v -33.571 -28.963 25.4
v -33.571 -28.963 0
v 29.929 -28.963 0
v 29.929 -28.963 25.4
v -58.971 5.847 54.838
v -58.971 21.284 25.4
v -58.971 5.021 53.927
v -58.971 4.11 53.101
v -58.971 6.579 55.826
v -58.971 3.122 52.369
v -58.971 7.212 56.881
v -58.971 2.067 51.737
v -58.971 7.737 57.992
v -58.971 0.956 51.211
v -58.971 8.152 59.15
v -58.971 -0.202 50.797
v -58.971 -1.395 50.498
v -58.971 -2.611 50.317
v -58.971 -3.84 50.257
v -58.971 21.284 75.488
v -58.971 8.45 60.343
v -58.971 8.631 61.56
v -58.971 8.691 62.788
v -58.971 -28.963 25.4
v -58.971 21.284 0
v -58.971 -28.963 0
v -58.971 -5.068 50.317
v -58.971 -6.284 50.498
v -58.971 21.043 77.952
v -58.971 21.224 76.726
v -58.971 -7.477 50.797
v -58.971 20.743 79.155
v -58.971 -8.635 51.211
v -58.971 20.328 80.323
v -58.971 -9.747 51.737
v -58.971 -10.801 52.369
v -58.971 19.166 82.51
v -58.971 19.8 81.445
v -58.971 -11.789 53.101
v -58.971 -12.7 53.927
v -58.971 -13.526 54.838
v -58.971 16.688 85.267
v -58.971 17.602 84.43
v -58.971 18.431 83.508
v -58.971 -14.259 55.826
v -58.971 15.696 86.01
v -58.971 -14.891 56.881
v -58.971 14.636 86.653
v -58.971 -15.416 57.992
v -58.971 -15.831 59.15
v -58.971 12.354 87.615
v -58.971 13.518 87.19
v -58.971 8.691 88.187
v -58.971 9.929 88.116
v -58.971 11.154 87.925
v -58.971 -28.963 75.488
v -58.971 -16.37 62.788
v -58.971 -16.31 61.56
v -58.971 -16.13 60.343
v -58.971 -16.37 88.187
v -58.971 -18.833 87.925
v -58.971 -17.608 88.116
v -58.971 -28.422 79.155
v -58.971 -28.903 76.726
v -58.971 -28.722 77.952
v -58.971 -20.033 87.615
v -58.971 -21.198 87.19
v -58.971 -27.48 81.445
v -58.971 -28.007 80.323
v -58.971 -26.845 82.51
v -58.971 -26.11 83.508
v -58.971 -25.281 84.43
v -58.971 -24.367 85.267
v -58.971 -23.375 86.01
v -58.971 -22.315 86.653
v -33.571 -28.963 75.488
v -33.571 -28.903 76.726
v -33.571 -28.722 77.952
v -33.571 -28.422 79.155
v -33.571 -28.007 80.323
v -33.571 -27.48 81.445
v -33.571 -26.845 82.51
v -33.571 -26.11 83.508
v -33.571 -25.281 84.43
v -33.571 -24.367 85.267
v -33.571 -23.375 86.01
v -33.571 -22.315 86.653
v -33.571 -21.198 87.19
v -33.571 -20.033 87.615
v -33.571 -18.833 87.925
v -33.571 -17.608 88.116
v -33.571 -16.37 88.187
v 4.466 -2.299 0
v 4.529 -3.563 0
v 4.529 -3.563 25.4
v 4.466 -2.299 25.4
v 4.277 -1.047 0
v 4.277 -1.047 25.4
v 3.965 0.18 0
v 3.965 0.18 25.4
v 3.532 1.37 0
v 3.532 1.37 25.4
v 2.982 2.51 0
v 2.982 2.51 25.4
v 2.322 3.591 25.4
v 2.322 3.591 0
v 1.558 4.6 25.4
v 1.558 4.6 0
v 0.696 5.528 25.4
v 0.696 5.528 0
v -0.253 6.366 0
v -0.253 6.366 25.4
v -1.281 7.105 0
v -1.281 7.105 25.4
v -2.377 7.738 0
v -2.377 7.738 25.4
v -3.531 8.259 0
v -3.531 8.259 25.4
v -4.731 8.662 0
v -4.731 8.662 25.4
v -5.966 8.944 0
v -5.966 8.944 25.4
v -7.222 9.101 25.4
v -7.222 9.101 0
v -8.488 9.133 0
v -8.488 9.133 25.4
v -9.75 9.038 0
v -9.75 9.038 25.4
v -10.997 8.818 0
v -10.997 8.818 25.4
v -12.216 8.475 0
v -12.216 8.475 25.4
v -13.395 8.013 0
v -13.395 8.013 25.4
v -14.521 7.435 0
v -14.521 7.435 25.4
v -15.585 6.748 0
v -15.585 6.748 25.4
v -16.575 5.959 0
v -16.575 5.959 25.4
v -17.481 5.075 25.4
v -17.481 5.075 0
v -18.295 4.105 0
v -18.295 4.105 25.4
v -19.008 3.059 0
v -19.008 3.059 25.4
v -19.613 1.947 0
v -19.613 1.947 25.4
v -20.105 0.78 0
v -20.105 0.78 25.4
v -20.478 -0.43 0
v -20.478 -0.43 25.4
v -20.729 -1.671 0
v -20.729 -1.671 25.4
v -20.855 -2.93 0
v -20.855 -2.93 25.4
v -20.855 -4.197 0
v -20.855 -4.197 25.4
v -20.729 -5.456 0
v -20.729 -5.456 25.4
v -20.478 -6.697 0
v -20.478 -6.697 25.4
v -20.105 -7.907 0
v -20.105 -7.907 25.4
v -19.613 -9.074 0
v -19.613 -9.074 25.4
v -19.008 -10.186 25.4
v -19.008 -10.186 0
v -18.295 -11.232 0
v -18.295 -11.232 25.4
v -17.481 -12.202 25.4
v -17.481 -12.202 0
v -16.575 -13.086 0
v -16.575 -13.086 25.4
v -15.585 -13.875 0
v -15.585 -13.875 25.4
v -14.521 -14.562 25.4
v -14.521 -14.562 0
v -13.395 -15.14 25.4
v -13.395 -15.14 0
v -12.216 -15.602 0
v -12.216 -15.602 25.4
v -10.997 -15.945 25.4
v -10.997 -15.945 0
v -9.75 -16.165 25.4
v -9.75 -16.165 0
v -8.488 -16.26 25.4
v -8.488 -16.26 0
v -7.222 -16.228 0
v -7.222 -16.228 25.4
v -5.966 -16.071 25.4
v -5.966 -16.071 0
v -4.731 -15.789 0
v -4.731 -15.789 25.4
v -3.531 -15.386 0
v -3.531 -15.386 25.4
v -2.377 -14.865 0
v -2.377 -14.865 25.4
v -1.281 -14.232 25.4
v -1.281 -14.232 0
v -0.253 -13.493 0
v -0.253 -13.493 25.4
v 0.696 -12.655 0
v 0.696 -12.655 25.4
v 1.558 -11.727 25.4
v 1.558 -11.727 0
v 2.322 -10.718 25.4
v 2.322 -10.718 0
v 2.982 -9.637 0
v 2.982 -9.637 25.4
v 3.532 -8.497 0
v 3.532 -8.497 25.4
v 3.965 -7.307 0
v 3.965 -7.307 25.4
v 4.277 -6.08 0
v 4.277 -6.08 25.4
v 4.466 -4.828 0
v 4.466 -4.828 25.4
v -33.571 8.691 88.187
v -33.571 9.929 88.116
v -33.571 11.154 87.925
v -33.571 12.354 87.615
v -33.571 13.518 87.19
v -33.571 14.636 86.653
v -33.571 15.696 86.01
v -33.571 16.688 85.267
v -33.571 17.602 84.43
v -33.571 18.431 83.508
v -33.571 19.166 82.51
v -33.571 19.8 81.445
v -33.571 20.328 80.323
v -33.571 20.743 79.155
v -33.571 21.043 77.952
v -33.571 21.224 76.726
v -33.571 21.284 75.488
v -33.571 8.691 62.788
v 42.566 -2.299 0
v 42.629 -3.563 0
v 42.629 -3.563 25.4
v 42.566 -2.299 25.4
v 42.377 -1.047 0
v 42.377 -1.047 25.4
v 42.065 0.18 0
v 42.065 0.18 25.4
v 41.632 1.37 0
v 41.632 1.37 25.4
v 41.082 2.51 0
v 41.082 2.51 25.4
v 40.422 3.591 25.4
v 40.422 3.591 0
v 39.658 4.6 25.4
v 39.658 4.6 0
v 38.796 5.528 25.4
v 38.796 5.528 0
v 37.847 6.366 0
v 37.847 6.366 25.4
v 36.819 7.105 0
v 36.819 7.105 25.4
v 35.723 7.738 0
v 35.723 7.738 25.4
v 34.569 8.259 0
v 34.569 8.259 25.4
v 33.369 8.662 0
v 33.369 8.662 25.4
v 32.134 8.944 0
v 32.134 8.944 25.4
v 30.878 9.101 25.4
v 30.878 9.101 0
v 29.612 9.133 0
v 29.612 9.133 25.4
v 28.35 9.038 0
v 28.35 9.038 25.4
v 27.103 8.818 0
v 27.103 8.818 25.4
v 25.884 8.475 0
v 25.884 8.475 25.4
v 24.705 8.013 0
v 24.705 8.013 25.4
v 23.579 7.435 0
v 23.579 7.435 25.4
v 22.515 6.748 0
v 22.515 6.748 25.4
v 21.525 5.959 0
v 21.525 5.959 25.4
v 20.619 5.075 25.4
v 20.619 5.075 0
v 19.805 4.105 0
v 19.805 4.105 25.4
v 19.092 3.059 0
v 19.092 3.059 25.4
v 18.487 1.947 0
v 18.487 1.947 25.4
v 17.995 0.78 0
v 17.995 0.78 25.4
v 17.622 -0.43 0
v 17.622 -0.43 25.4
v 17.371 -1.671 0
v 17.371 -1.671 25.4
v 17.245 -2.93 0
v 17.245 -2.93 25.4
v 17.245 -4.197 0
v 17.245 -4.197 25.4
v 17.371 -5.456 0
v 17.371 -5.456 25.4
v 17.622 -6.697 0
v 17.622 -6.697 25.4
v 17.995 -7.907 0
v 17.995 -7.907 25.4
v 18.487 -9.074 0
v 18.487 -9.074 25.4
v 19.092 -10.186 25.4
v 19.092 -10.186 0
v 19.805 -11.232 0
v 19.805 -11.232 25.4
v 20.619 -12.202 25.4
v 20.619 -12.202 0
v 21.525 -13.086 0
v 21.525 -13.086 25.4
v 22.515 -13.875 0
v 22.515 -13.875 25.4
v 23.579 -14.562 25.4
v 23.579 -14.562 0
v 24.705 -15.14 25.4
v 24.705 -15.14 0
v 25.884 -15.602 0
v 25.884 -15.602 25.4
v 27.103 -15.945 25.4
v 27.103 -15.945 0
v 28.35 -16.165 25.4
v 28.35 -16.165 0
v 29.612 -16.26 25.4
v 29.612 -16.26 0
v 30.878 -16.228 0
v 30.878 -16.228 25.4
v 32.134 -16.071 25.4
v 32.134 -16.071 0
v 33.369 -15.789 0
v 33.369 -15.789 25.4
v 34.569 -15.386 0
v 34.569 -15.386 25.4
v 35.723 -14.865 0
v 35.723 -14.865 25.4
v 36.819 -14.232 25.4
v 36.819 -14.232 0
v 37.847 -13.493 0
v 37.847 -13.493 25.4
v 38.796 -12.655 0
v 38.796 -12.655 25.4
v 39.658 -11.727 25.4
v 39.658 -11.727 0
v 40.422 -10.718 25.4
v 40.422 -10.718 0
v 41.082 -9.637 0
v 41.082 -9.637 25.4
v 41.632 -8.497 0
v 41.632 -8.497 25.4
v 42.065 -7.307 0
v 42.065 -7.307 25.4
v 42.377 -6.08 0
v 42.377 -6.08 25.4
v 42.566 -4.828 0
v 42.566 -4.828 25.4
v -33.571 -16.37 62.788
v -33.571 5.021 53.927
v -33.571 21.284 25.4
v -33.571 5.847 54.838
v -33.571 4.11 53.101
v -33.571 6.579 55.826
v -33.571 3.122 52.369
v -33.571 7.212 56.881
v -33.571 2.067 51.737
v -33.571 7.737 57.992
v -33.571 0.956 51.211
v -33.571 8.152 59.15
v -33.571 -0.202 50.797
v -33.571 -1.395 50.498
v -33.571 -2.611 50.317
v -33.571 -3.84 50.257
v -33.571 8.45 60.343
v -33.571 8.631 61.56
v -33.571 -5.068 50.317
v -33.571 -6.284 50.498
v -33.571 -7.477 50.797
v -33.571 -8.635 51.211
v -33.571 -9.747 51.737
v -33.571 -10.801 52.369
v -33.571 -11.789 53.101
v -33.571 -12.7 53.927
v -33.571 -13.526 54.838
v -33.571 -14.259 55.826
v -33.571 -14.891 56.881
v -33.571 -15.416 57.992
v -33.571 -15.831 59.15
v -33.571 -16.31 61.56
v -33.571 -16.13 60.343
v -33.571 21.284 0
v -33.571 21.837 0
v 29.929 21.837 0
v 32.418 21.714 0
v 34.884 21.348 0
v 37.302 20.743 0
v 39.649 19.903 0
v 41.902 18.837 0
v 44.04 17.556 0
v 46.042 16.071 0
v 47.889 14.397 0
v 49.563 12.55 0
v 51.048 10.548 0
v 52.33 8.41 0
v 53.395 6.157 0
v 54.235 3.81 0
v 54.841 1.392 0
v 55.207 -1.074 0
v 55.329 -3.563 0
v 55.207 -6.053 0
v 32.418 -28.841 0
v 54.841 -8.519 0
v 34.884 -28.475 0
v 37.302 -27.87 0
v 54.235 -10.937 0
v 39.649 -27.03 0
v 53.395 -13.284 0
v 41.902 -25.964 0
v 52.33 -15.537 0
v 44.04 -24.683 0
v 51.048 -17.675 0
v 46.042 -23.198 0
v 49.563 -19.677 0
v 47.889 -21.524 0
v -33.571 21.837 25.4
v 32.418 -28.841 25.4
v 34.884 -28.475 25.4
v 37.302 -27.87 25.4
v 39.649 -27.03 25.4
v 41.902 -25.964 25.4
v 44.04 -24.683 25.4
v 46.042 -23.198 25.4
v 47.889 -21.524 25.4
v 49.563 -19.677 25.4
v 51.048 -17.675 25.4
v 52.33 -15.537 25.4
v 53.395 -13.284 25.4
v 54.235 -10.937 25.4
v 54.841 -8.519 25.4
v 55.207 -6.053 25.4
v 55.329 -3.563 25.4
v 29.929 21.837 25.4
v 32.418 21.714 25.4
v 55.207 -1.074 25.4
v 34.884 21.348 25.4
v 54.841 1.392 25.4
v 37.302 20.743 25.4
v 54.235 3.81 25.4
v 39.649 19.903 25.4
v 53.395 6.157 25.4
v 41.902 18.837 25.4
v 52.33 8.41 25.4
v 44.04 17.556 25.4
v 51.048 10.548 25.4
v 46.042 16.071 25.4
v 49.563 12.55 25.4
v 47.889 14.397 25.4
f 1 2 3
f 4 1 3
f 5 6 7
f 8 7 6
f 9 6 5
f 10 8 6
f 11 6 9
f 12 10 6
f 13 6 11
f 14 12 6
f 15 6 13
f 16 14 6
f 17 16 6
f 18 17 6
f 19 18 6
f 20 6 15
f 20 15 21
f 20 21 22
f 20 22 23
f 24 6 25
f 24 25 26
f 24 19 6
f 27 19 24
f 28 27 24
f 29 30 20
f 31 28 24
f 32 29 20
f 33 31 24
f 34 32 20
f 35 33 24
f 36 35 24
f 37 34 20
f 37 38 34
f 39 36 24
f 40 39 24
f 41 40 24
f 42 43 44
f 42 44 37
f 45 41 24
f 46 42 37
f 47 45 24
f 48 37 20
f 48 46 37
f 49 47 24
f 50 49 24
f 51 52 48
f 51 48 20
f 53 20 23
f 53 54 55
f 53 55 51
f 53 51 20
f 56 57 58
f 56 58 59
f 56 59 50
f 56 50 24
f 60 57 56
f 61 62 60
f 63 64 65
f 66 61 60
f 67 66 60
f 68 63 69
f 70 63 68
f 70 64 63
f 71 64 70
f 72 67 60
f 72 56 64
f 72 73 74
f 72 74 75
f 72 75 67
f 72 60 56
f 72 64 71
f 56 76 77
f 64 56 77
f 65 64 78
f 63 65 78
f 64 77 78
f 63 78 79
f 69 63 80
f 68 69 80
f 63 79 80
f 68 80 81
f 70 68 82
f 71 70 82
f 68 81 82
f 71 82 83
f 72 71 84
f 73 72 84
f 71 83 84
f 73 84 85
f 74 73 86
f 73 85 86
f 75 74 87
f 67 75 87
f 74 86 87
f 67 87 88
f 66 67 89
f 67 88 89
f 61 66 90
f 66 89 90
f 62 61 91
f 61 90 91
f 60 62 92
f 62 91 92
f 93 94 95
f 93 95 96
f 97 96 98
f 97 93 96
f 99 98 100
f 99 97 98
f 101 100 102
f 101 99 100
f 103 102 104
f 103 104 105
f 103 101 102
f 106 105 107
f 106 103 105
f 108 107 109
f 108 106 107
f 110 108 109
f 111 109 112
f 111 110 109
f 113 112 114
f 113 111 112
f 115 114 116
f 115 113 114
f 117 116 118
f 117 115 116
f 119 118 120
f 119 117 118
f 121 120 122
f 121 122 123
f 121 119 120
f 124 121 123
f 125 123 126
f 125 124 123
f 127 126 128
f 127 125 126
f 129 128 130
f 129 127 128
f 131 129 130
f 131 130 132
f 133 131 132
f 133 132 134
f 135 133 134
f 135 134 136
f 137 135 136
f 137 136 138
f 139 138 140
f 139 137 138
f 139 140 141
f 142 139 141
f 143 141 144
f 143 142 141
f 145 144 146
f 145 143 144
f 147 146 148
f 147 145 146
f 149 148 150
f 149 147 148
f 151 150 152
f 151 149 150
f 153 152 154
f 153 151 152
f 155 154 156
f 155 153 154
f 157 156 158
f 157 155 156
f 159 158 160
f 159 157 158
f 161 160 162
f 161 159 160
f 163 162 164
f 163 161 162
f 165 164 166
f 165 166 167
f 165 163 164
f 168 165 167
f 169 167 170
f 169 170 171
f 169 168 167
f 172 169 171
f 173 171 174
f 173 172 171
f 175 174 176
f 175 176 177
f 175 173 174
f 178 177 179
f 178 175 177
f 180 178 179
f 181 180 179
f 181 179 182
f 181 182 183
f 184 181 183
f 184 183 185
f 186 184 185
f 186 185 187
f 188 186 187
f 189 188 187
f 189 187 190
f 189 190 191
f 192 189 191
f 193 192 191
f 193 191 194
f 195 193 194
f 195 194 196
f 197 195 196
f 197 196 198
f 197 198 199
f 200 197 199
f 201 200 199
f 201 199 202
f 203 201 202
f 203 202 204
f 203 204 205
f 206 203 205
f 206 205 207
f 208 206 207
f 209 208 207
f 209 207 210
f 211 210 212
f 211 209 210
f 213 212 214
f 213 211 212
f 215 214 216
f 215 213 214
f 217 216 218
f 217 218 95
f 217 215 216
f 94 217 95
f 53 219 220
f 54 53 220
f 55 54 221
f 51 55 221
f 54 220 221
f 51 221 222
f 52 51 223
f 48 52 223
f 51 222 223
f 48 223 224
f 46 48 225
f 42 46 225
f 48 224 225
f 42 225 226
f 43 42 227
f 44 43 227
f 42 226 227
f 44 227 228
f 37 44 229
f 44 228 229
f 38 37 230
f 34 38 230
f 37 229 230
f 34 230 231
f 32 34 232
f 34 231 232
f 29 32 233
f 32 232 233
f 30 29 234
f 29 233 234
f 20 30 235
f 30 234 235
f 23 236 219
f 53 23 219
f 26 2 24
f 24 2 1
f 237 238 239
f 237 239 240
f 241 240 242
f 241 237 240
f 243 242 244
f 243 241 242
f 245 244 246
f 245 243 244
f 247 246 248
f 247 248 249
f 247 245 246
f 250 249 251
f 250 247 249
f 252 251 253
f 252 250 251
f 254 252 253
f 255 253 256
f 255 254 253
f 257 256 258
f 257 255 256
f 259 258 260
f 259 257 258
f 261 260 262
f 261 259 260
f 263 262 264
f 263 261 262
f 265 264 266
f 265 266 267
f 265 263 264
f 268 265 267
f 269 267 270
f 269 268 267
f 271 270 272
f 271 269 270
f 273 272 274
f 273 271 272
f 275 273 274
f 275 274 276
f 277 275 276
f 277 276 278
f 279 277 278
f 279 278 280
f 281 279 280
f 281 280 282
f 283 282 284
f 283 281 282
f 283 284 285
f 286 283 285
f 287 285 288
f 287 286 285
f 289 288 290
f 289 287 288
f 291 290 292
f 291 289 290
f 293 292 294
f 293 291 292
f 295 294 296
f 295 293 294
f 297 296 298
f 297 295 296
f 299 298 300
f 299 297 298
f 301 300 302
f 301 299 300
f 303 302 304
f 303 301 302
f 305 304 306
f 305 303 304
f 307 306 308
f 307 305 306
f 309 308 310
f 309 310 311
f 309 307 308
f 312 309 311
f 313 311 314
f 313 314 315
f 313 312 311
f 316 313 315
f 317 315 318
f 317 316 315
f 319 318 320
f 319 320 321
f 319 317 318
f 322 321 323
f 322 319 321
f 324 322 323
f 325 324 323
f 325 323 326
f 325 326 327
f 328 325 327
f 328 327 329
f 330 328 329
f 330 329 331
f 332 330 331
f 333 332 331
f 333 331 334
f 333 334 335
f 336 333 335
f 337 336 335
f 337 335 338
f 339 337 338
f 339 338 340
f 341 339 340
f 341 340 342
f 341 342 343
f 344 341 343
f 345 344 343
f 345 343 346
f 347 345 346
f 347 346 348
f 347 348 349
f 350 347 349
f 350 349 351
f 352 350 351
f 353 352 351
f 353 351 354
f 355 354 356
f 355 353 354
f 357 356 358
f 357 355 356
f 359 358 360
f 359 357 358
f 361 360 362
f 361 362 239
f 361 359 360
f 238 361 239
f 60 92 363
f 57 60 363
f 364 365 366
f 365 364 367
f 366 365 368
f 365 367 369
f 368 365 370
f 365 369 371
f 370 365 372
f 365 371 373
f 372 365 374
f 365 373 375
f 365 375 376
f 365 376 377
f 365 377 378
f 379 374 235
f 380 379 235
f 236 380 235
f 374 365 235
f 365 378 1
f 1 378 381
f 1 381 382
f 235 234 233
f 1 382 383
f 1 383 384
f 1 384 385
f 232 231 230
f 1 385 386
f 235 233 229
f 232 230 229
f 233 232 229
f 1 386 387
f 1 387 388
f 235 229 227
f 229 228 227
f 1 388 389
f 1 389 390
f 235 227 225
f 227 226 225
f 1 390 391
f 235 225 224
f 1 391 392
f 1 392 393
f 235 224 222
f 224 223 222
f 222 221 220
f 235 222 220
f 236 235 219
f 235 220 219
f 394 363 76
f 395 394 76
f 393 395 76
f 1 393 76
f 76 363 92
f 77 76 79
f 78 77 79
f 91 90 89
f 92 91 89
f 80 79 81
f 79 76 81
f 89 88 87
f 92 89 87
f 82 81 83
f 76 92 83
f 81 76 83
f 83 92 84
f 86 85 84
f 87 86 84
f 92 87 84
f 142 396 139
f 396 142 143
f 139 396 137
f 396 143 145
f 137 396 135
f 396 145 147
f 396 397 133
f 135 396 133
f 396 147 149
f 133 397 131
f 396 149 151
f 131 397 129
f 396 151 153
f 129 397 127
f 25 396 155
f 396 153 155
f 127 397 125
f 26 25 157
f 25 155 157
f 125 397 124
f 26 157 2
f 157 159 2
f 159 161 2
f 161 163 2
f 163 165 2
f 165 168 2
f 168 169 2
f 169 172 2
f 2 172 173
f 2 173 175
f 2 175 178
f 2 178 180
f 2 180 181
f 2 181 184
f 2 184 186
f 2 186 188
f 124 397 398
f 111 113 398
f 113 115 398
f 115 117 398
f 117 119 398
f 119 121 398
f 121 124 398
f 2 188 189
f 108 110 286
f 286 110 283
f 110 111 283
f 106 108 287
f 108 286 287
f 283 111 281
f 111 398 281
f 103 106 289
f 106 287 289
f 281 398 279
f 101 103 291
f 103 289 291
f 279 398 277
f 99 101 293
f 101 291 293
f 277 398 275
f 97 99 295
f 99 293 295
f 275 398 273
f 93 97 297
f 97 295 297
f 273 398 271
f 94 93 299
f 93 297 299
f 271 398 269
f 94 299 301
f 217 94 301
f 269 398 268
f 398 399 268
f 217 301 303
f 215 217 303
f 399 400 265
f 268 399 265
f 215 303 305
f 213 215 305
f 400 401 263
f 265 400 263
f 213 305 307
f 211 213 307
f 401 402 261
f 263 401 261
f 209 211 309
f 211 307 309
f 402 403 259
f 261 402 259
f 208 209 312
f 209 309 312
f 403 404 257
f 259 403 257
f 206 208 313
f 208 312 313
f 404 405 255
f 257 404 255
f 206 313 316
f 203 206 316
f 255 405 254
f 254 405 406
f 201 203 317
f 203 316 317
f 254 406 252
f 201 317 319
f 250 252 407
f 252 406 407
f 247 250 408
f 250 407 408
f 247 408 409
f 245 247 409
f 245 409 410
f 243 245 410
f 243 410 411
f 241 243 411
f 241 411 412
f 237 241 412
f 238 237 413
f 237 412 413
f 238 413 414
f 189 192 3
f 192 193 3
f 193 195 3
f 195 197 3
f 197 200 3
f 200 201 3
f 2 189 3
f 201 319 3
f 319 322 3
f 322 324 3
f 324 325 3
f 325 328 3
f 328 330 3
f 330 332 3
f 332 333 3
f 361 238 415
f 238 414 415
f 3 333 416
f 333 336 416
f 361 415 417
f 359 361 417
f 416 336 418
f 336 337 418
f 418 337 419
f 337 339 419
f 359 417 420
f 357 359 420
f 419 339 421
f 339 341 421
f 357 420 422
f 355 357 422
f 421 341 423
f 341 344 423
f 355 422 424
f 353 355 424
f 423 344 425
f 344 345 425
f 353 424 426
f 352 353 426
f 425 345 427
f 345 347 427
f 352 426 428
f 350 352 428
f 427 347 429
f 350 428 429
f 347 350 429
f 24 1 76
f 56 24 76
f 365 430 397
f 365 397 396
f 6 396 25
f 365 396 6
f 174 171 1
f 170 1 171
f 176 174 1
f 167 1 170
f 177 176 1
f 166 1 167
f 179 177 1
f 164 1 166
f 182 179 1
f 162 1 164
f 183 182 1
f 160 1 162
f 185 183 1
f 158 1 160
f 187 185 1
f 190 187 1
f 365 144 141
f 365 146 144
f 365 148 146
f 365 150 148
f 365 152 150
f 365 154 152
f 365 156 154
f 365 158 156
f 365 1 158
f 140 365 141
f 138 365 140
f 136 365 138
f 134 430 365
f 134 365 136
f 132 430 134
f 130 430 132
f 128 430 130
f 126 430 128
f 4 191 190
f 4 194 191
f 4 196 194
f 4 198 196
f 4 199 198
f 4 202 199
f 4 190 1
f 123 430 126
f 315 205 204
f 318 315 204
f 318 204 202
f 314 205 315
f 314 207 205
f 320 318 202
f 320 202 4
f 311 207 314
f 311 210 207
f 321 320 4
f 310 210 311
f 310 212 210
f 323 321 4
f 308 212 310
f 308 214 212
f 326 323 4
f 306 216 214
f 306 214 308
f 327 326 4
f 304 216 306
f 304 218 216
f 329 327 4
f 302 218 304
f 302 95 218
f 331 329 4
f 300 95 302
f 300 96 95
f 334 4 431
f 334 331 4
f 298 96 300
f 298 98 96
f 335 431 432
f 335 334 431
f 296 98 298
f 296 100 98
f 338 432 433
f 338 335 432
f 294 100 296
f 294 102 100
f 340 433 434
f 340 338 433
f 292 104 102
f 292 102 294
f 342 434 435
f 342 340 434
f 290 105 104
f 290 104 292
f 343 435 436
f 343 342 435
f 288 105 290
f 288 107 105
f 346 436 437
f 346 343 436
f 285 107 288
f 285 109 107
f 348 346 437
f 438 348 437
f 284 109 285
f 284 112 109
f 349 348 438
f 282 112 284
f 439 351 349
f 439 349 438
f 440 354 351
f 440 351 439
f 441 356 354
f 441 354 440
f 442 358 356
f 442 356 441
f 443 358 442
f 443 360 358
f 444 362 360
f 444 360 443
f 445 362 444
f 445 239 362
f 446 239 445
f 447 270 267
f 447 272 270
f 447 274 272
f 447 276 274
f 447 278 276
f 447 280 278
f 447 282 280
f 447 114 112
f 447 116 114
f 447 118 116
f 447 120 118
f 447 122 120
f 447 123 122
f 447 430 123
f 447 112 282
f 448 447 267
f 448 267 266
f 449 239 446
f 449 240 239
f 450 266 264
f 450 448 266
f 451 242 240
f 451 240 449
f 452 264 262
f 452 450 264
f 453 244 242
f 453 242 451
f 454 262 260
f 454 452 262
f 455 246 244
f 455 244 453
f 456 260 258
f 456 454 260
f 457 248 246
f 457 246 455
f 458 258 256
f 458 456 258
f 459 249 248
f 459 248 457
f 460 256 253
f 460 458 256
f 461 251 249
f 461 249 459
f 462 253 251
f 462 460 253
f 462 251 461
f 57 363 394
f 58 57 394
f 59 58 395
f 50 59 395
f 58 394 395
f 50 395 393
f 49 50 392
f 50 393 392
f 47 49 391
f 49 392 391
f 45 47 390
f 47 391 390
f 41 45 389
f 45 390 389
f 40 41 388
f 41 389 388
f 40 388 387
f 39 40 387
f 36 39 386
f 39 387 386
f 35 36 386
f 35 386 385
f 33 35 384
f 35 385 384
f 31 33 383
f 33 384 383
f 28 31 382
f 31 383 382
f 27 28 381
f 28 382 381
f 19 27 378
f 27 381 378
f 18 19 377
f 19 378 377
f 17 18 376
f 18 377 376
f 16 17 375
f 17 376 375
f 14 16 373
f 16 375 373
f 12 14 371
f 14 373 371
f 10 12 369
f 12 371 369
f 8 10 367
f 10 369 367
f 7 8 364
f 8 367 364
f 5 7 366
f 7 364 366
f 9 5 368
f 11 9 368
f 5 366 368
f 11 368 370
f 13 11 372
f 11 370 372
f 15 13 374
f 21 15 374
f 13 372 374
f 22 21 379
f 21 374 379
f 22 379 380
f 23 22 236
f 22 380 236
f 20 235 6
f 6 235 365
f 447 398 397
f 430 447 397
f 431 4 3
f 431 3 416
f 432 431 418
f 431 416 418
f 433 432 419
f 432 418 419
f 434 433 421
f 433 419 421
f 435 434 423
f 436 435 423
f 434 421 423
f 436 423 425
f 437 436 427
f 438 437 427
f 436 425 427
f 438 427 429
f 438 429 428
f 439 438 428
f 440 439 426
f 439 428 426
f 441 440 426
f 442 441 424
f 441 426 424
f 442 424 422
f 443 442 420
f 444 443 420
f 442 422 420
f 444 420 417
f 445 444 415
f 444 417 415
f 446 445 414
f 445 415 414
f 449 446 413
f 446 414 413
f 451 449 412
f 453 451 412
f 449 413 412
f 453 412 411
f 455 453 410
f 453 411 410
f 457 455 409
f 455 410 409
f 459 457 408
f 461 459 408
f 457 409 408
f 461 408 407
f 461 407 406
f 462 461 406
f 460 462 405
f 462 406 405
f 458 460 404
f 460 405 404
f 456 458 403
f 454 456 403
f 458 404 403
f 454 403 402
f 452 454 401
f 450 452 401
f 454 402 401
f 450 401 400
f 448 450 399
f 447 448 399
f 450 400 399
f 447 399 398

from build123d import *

# Parameters (mm, degrees)
F0_R     = 12.7
F1_DEPTH = 25.4
F2_W     = 50.247877
F2_H     = 25.4
F3_DEPTH = 25.4


with BuildPart() as f1:
    # F0 (on Top) → F1 (new body)
    with BuildSketch(Plane.XY):
        with BuildLine():
            Line((29.928832, 21.836502), (-33.571168, 21.836502))
            Line((-33.571168, 21.836502), (-33.571168, -28.963498))
            Line((-33.571168, -28.963498), (29.928832, -28.963498))
            ThreePointArc((29.928832, -28.963498), (55.328832, -3.563498), (29.928832, 21.836502))
        make_face()
        with Locations((-8.171168, -3.563498)):
            Circle(F0_R, mode=Mode.SUBTRACT)
        with Locations((29.928832, -3.563498)):
            Circle(F0_R, mode=Mode.SUBTRACT)
    extrude(amount=F1_DEPTH)

    # F2 (on face) → F3 (join)
    with BuildSketch(Plane(origin=(-33.571168, 0, 0), x_dir=(0, -1, 0), z_dir=(-1, 0, 0))):
        with BuildLine():
            Line((-21.284379, 25.4), (28.963498, 25.4))
            Line((28.963498, 25.4), (28.963498, 62.787746))
            Line((28.963498, 62.787746), (28.963498, 75.487746))
            ThreePointArc((28.963498, 75.487746), (25.281452, 84.430145), (16.370348, 88.187297))
            Line((16.370348, 88.187297), (16.370348, 62.787746))
            ThreePointArc((16.370348, 62.787746), (3.839559, 50.256958), (-8.691229, 62.787746))
            Line((-8.691229, 62.787746), (-8.691229, 88.187297))
            ThreePointArc((-8.691229, 88.187297), (-17.602333, 84.430145), (-21.284379, 75.487746))
            Line((-21.284379, 75.487746), (-21.284379, 62.787746))
            Line((-21.284379, 62.787746), (-21.284379, 25.4))
        make_face()
        with Locations((3.83956, 12.7)):
            Rectangle(F2_W, F2_H)
    extrude(amount=F3_DEPTH)


solid = f1.part
